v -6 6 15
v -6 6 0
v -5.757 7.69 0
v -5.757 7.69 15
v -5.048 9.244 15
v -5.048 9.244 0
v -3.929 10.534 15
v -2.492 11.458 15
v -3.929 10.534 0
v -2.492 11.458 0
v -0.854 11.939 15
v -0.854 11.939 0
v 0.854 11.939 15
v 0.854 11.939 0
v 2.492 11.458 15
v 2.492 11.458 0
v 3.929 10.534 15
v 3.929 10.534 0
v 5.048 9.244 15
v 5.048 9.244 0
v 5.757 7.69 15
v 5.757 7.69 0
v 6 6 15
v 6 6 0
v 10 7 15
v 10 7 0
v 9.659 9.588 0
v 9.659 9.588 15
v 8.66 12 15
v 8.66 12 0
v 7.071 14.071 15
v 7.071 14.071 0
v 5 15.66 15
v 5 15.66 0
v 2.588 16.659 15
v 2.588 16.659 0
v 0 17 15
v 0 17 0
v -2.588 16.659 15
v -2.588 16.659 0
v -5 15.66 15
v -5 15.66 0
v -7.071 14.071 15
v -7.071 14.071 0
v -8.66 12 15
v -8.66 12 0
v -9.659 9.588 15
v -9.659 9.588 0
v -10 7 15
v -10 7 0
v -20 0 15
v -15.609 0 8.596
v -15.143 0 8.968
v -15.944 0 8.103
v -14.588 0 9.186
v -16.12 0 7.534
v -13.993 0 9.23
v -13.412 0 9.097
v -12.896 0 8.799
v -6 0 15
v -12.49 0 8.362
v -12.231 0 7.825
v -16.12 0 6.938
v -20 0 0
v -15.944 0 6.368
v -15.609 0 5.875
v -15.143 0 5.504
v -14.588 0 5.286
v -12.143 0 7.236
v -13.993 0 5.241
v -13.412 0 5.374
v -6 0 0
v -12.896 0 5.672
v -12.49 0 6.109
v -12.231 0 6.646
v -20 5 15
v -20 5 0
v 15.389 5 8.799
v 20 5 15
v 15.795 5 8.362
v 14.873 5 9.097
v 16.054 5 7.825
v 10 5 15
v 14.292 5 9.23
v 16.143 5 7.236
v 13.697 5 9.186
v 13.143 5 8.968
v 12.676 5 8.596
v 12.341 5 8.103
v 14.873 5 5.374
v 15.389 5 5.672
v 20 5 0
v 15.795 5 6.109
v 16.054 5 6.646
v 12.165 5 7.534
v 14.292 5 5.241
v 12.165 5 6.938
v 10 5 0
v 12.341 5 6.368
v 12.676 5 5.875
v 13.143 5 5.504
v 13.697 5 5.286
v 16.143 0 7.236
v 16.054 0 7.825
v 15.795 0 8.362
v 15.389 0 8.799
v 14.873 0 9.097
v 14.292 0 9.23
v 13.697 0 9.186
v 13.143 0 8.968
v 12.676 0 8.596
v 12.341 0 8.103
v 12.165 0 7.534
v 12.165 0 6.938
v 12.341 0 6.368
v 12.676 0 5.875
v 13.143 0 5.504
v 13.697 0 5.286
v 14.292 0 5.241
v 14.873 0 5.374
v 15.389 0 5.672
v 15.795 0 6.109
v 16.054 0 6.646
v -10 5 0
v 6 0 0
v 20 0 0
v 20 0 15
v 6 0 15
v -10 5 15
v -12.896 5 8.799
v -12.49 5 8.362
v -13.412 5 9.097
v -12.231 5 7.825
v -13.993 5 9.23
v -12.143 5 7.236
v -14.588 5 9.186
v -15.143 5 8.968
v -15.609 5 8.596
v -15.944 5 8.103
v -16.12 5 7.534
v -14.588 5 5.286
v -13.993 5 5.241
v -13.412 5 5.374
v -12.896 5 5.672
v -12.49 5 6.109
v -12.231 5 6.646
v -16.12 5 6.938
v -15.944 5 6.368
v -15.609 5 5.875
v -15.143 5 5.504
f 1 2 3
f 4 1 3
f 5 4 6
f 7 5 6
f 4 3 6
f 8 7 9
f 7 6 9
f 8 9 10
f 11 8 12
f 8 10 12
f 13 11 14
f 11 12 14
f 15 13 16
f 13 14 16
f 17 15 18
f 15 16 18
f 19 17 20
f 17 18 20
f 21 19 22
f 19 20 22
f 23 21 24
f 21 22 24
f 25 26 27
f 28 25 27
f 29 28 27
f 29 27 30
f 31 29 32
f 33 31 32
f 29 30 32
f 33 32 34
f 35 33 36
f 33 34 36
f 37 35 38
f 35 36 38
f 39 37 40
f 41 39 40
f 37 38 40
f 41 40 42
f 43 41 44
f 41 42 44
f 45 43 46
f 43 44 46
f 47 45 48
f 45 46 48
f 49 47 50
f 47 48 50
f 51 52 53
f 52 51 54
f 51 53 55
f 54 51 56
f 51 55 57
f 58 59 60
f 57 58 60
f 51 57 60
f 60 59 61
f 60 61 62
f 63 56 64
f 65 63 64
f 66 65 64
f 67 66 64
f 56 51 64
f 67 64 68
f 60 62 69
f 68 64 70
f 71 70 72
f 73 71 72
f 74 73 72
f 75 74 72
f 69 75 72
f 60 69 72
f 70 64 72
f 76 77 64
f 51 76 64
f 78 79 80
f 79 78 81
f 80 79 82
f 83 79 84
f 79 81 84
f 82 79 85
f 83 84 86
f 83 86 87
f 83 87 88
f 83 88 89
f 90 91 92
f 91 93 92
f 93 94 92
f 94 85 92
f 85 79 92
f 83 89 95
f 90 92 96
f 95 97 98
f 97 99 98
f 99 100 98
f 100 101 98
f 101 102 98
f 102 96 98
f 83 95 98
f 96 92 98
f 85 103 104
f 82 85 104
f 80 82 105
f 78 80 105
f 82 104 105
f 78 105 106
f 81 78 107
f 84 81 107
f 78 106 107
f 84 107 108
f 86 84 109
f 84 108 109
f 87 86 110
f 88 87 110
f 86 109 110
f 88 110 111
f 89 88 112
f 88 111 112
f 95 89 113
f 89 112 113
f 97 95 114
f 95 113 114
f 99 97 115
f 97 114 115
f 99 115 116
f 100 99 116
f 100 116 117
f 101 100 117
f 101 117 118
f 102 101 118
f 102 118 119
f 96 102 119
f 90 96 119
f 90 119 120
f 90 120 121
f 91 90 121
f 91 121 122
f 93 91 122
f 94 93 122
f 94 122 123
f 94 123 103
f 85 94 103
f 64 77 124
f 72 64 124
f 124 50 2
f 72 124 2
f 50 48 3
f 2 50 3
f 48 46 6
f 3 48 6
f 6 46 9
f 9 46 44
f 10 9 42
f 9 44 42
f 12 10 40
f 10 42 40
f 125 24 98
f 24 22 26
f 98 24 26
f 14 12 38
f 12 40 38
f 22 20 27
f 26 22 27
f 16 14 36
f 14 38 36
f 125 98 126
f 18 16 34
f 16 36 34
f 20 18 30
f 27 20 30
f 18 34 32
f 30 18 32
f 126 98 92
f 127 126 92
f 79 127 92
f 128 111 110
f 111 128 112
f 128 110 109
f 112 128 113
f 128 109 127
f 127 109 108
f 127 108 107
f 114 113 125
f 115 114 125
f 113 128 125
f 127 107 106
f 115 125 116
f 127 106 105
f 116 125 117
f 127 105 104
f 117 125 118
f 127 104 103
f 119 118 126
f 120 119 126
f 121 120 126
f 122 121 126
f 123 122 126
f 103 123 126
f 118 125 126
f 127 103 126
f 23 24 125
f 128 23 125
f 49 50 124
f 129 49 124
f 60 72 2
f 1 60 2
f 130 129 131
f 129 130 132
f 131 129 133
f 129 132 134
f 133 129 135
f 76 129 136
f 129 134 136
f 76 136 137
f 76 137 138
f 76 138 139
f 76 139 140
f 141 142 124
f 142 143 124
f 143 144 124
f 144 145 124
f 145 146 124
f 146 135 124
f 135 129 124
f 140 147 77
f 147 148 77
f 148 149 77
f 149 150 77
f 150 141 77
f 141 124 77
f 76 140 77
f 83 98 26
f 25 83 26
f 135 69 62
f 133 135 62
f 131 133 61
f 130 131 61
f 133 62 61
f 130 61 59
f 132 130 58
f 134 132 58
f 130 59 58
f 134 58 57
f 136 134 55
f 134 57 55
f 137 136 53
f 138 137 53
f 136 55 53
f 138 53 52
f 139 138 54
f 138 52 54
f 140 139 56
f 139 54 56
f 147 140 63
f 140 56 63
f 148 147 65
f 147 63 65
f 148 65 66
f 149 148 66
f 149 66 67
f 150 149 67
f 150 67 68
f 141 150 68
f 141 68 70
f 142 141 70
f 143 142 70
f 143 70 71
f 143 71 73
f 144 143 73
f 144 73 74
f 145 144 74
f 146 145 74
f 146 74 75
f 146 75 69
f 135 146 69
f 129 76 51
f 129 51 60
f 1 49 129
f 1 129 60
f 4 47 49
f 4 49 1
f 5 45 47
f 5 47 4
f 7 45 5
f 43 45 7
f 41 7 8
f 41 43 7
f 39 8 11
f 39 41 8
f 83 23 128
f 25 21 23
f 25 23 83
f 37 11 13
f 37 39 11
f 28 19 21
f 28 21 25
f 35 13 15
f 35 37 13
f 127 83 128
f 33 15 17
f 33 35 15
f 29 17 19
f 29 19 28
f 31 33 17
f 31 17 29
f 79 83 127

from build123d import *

# Parameters (mm, degrees)
F1_DEPTH = 15
F2_R     = 2
F3_DEPTH = 25


with BuildPart() as f1:
    # F0 (on Top) → F1 (new body)
    with BuildSketch(Plane.XY):
        with BuildLine():
            ThreePointArc((10, 7), (0, 17), (-10, 7))
            Line((-10, 7), (-10, 5))
            Line((-10, 5), (-20, 5))
            Line((-20, 5), (-20, 0))
            Line((-20, 0), (-6, 0))
            Line((-6, 0), (-6, 6))
            ThreePointArc((-6, 6), (0, 12), (6, 6))
            Line((6, 6), (6, 0))
            Line((6, 0), (20, 0))
            Line((20, 0), (20, 5))
            Line((20, 5), (10, 5))
            Line((10, 5), (10, 7))
        make_face()
    extrude(amount=F1_DEPTH)

    # F2 (on Front) → F3 (cut)
    with BuildSketch(Plane.XZ):
        with Locations((-14.142513, 7.235705)):
            Circle(F2_R)
        with Locations((14.142513, 7.235705)):
            Circle(F2_R)
    extrude(amount=-F3_DEPTH, mode=Mode.SUBTRACT)


solid = f1.part
